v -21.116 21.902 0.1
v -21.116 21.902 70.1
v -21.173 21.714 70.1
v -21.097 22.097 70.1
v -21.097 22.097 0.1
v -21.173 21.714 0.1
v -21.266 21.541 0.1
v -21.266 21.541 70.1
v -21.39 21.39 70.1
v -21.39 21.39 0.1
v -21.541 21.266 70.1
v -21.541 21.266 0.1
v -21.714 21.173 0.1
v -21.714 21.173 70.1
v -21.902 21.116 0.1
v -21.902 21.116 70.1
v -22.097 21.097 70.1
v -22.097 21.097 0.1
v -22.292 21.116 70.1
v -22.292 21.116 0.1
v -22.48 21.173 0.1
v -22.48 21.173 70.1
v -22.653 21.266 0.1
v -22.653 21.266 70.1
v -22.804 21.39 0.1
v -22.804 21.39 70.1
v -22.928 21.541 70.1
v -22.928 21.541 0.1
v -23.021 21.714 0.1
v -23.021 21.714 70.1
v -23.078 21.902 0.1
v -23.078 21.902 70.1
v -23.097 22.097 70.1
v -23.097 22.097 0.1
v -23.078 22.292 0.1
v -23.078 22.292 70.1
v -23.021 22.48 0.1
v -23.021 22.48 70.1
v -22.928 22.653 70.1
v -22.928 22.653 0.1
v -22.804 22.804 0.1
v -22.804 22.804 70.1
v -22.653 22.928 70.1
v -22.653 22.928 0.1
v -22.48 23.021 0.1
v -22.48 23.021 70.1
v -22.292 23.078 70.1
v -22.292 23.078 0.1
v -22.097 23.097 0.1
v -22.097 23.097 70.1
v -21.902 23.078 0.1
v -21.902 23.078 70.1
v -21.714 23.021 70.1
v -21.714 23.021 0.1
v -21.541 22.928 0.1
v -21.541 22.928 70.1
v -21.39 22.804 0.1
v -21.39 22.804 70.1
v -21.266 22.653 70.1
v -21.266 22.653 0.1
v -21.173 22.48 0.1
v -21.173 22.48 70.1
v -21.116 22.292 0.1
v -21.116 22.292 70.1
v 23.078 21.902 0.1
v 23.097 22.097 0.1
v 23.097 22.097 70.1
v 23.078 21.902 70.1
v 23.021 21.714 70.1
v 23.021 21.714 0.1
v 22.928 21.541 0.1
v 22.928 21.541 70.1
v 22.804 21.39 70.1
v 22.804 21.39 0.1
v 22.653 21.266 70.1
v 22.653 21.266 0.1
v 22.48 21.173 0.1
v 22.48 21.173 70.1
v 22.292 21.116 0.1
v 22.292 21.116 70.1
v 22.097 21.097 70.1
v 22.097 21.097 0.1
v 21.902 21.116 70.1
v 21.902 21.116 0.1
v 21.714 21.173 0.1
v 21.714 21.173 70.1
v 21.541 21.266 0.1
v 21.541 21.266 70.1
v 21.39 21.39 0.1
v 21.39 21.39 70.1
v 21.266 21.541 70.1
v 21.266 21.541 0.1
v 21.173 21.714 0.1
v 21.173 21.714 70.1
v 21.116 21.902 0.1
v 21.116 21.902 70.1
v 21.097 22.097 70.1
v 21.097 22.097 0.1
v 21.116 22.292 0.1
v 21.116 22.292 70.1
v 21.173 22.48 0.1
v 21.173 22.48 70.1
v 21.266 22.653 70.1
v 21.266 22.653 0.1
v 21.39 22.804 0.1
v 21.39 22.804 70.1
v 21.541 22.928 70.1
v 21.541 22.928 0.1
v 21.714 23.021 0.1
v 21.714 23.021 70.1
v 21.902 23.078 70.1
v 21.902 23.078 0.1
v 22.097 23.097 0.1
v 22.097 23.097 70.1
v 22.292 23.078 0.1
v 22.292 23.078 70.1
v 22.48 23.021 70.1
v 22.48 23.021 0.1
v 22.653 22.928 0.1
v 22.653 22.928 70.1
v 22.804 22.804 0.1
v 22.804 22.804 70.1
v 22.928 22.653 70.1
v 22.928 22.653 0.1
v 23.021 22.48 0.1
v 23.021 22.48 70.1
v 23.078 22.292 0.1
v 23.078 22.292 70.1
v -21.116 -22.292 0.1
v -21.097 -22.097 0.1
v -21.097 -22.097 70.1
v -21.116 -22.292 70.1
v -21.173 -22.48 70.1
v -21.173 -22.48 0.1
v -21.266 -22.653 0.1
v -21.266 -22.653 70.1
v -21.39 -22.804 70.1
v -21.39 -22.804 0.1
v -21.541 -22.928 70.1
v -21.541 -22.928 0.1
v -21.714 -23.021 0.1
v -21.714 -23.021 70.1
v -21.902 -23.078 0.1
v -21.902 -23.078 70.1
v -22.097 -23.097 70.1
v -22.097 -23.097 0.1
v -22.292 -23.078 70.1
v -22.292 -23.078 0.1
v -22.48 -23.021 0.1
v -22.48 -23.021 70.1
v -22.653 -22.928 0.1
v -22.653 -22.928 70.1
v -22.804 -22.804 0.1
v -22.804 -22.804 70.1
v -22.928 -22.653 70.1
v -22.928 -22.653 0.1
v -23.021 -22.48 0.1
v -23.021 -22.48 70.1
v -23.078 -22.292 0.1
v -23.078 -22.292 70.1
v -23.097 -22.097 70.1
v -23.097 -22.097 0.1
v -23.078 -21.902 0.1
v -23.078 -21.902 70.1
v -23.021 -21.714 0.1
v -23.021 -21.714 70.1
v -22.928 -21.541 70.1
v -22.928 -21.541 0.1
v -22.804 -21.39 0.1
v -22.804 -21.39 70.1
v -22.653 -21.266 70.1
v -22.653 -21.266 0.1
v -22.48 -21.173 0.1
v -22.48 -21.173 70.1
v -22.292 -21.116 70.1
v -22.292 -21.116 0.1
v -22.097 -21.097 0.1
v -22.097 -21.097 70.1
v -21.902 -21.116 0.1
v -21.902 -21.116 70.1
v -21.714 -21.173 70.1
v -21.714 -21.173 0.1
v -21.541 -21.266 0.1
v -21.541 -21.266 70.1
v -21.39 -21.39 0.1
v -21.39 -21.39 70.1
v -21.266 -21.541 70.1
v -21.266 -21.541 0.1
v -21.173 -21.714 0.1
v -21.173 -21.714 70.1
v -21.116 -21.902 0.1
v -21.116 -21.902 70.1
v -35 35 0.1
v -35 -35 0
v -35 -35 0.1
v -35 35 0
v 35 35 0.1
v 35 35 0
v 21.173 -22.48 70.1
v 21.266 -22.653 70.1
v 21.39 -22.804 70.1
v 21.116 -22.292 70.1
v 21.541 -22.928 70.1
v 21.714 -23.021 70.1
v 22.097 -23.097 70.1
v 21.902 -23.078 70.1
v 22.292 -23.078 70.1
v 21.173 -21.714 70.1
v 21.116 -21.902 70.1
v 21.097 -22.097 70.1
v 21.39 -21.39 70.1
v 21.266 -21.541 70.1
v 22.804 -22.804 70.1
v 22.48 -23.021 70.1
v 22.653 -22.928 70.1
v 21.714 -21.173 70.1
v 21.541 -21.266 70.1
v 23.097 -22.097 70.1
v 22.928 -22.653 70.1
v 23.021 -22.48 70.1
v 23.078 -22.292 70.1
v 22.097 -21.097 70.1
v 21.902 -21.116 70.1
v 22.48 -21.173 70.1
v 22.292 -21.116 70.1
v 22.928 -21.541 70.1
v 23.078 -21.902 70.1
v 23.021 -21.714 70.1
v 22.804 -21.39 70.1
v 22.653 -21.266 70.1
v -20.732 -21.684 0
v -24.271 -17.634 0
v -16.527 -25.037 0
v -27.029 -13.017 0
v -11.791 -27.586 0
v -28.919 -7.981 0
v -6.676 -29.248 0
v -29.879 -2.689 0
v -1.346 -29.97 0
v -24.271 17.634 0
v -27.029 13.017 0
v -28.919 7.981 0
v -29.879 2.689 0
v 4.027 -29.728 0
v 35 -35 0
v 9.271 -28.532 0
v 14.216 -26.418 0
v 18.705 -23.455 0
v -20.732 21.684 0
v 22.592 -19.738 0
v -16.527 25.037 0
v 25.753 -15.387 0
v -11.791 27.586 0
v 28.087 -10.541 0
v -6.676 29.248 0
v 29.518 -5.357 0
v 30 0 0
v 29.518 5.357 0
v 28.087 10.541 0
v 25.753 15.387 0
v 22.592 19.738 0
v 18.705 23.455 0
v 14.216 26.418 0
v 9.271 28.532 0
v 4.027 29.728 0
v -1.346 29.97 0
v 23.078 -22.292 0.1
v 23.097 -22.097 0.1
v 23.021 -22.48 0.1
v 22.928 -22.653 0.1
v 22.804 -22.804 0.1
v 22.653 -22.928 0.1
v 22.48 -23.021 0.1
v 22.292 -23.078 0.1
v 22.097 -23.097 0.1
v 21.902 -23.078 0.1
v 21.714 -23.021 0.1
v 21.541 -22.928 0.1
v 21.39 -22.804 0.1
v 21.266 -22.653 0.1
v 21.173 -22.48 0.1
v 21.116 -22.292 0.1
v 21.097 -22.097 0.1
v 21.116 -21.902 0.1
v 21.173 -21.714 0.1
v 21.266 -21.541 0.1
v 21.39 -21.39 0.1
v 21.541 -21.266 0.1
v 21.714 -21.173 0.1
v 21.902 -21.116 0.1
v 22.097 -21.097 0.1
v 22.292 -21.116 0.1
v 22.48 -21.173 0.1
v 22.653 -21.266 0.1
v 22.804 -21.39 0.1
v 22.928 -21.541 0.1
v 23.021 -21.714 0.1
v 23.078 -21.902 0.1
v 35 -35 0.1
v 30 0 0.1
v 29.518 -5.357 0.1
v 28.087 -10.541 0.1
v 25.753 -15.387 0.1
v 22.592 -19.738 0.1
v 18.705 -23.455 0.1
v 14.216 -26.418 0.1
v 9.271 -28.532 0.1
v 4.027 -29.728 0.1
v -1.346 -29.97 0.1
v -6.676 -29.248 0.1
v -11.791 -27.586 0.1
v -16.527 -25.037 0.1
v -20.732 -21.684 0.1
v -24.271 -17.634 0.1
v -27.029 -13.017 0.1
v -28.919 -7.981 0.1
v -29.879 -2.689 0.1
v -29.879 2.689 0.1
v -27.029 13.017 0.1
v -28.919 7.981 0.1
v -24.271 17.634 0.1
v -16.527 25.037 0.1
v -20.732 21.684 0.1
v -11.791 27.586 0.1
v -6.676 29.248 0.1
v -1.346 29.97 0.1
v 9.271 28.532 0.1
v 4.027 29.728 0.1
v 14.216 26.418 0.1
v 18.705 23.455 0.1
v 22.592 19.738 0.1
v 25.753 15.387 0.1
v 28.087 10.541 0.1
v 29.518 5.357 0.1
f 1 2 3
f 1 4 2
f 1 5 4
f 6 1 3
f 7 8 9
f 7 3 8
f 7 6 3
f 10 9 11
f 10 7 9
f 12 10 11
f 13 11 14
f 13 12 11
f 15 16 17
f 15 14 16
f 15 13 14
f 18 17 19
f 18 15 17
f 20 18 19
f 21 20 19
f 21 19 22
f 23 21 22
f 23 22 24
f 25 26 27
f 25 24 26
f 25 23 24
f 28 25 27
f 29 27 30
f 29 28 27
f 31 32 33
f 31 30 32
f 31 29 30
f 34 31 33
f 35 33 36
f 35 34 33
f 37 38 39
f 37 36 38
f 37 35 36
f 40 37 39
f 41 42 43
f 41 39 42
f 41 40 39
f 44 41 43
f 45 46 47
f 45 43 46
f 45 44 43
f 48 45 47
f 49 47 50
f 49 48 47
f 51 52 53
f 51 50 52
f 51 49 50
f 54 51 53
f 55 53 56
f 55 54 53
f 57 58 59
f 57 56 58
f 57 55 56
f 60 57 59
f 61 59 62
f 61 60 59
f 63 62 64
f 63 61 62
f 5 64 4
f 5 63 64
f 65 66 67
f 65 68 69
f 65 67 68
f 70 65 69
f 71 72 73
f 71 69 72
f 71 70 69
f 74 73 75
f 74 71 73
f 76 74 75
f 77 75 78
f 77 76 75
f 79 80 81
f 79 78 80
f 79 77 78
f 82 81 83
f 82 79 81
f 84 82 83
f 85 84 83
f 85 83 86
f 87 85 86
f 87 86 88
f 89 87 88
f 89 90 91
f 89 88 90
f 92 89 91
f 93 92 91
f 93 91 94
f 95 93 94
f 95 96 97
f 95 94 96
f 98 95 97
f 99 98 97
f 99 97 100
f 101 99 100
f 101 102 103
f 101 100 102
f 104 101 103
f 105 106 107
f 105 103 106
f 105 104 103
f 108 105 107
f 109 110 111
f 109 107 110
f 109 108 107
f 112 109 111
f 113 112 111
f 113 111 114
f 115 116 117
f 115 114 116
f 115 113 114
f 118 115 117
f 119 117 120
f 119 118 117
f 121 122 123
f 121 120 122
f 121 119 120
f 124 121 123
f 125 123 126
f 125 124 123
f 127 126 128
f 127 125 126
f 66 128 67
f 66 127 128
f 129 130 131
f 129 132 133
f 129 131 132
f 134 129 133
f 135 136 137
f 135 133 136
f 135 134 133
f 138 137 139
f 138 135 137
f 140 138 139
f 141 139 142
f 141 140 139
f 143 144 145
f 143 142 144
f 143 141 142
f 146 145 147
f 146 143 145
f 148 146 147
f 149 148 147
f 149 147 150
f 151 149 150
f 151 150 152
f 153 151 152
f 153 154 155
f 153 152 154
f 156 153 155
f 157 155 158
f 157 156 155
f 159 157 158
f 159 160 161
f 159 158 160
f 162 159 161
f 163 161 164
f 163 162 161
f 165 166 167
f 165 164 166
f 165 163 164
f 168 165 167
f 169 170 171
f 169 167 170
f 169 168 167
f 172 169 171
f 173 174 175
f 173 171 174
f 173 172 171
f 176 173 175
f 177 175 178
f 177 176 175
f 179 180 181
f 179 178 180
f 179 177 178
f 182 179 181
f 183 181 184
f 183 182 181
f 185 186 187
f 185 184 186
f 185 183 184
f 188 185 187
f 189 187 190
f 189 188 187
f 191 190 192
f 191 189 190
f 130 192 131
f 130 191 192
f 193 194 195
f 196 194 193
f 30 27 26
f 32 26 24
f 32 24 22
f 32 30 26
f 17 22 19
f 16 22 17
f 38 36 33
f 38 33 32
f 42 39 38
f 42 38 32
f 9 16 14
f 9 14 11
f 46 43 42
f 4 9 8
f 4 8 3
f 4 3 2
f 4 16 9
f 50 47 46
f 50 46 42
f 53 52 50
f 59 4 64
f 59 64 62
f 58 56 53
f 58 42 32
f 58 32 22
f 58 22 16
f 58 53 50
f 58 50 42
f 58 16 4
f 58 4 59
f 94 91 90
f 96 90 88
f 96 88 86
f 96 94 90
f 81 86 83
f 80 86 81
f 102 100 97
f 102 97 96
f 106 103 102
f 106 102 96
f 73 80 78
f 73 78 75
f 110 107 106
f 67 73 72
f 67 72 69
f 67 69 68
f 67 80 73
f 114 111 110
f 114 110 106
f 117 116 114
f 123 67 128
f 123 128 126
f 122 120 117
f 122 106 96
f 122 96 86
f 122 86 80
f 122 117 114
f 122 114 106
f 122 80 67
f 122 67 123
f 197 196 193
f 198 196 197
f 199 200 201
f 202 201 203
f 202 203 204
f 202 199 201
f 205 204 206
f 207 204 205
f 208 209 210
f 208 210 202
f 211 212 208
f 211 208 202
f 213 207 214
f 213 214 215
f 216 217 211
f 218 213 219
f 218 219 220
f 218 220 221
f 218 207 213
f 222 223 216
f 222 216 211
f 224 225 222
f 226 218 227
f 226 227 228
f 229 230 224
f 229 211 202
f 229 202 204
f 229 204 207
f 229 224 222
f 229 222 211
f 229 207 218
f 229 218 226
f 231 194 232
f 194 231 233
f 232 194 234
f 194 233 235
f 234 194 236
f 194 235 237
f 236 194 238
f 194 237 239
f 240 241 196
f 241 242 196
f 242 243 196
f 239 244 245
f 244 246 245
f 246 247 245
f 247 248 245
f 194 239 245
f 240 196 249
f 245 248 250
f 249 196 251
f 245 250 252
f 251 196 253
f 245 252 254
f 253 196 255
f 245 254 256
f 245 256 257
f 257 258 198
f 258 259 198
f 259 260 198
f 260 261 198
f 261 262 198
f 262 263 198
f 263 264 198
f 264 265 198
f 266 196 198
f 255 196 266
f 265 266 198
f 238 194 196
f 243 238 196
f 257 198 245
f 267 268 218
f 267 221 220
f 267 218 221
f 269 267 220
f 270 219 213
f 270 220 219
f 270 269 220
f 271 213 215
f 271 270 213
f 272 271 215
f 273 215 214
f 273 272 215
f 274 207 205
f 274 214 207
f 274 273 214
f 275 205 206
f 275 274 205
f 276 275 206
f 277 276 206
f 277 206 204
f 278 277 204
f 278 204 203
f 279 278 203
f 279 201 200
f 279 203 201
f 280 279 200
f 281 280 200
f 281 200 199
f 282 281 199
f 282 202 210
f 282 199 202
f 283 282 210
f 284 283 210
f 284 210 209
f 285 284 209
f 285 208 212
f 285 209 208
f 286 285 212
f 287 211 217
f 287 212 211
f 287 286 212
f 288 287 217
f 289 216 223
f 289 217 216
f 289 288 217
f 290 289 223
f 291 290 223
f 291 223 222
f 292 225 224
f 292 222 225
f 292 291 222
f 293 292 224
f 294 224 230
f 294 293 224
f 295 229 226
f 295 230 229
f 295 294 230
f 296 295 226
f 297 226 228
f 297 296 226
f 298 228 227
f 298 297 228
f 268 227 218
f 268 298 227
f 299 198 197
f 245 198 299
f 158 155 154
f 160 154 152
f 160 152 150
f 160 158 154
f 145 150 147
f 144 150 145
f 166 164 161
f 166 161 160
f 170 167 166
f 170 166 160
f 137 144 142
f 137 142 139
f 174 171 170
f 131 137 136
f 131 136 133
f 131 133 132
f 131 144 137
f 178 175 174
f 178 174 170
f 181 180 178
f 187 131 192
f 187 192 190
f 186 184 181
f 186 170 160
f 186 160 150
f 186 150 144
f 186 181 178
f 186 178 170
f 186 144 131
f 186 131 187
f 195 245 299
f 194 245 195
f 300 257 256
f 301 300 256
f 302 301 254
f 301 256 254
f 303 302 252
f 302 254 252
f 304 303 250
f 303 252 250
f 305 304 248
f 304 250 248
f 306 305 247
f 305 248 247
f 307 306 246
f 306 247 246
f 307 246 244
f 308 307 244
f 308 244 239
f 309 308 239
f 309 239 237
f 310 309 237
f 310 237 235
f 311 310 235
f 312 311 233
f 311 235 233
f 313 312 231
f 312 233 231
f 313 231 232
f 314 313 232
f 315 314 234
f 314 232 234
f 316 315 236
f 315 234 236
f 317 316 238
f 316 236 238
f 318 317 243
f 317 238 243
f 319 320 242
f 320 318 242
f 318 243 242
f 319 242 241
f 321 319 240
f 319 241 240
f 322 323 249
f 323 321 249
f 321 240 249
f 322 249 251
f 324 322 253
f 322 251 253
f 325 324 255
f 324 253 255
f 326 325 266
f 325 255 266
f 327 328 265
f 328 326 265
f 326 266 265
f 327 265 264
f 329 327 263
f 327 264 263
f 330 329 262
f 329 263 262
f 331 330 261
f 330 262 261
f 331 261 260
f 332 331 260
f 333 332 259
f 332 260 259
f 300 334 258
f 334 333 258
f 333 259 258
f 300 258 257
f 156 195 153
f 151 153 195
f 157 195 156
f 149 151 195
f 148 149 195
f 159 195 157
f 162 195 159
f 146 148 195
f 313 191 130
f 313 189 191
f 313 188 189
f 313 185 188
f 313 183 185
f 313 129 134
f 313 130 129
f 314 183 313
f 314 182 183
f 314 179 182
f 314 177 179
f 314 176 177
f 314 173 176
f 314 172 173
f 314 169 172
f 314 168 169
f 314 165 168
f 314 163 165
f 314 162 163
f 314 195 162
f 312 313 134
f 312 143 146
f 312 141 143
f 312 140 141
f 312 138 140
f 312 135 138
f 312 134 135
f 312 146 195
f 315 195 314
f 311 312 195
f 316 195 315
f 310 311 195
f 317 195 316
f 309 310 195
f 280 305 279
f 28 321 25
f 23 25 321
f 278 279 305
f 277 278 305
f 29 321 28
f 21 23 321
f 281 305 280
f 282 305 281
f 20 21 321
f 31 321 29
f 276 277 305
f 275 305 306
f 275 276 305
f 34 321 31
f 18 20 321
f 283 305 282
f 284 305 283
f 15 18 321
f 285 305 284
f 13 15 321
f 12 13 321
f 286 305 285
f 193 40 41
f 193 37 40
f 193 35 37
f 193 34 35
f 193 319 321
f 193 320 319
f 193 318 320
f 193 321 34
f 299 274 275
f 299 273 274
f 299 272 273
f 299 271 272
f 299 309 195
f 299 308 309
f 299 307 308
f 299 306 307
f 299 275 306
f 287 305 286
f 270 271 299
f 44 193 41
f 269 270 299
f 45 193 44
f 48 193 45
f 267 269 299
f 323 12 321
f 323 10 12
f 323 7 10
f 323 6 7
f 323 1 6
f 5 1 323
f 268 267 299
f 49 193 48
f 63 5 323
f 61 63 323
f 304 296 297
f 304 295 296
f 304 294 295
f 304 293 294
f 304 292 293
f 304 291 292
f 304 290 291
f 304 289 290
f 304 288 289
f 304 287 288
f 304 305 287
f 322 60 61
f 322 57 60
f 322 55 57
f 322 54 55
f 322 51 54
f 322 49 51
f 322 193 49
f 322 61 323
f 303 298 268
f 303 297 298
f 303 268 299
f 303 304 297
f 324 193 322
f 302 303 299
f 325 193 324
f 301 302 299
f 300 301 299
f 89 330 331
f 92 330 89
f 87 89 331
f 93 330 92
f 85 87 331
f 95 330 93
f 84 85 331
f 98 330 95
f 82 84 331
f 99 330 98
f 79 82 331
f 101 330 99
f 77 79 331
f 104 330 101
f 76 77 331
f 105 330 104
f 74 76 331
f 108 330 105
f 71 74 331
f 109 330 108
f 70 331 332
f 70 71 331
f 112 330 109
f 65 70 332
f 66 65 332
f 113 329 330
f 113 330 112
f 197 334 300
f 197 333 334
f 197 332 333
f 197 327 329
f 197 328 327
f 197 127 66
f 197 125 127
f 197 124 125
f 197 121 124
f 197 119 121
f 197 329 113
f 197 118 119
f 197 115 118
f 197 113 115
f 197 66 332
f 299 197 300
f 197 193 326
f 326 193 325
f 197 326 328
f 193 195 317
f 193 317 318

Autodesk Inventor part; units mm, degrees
ref_plane "YZ Plane" through (0, 0, 0) normal (1, 0, 0) x (0, 1, 0)
ref_plane "XZ Plane" through (0, 0, 0) normal (0, 1, 0) x (-1, 0, 0)
ref_plane "XY Plane" through (0, 0, 0) normal (0, 0, 1) x (1, 0, 0)
sketch "Sketch1" plane through (0, 0, 0) normal (0, 0, 1) x (1, 0, 0)
  line L0 (-35, 35) -> (35, 35)
  line L1 (35, 35) -> (35, -35)
  line L2 (35, -35) -> (-35, -35)
  line L3 (-35, -35) -> (-35, 35)
  line L4 (-35, 35) -> (35, -35) construction
  line L5 (35, 35) -> (-35, -35) construction
  circle A0 centre (0, 0) radius 30
  dimension "d0" = 70
  dimension "d1" = 70
  dimension "d2" = 60
extrude "Extrusion1" add sketch "Sketch1" along normal blind 0.1
sketch "Sketch2" plane through (0, 0, 0.1) normal (0, 0, 1) x (1, 0, 0)
  circle A0 centre (-22.097, 22.097) radius 1
  circle A1 centre (22.097, 22.097) radius 1
  circle A2 centre (22.097, -22.097) radius 1
  circle A3 centre (-22.097, -22.097) radius 1
  line L0 (-35, 35) -> (-35, -35) projected
  line L1 (35, 35) -> (-35, 35) projected
  line L2 (35, -35) -> (35, 35) projected
  line L3 (-35, -35) -> (35, -35) projected
  point P0 (0, 0)
  dimension "d5" = 2
  dimension "d6" = 2
  dimension "d7" = 2
  dimension "d8" = 2
  dimension "d9" = 12.903
  dimension "d10" = 12.903
  dimension "d11" = 12.903
  dimension "d12" = 12.903
  dimension "d13" = 12.903
  dimension "d14" = 12.903
  dimension "d15" = 12.903
  dimension "d16" = 12.903
extrude "Extrusion2" add sketch "Sketch2" along normal blind 70 contours A0 | A1 | A2 | A3
properties part number "electrode_holder"
